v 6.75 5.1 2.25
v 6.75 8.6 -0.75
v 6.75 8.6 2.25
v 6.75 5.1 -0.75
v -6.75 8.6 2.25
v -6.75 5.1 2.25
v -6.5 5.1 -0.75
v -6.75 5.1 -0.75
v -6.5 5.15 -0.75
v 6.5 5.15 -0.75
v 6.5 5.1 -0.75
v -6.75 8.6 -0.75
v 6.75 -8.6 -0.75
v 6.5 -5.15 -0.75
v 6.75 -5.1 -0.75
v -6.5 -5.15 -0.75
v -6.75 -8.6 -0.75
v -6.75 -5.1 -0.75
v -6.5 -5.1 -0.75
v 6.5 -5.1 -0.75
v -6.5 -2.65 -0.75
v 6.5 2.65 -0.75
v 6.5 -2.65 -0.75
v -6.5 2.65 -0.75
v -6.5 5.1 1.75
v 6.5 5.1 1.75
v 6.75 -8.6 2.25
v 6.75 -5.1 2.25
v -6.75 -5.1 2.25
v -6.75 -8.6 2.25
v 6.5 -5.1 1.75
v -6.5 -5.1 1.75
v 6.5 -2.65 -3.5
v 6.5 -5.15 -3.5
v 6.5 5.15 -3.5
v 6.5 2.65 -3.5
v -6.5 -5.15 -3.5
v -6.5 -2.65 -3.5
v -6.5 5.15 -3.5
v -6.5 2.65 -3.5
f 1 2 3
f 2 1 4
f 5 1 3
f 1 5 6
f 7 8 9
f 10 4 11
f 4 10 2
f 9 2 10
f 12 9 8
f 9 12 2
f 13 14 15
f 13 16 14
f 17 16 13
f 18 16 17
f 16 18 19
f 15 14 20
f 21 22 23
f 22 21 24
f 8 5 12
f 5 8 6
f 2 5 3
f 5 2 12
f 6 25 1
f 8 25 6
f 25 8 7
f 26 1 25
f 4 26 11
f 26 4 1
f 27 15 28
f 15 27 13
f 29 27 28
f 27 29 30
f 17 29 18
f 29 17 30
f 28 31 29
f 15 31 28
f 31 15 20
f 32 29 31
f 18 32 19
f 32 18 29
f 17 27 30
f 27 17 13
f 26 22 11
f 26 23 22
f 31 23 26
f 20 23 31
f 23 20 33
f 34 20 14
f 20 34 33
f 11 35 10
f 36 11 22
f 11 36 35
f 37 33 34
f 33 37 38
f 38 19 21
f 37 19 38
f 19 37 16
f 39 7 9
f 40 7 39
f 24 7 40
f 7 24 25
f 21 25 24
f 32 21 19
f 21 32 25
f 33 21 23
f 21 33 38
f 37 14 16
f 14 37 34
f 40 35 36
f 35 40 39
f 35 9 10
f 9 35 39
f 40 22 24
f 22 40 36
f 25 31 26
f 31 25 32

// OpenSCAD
//Pololu drv8838 single brushed DC motor driver carrier

module make_pololu_drv8838(tol=0, header_length=0, headers=1){

    //smd bb
    translate([0,0,1])
    cube([13, 5+6, 1+tol], center=true);
    
    //board
    cube([13, 10.3, 1+tol], center=true);
    
    if(headers)
    //headers
    color("blue")
    for(i=[0:1])
    mirror([0,i,0])
    translate([0, 6.5 + header_length/2 + 0.35, 0.75])
    cube([13+0.5, 3.5+header_length, 2.5+tol], center=true);
    
    //through pin bb
    color("orange")
    for(i=[-1:2:1])
    translate([0, 3.9*i, -2])
    cube([13,2.5,3], center=true);
}

make_pololu_drv8838(tol=0.5, header_length=0);
